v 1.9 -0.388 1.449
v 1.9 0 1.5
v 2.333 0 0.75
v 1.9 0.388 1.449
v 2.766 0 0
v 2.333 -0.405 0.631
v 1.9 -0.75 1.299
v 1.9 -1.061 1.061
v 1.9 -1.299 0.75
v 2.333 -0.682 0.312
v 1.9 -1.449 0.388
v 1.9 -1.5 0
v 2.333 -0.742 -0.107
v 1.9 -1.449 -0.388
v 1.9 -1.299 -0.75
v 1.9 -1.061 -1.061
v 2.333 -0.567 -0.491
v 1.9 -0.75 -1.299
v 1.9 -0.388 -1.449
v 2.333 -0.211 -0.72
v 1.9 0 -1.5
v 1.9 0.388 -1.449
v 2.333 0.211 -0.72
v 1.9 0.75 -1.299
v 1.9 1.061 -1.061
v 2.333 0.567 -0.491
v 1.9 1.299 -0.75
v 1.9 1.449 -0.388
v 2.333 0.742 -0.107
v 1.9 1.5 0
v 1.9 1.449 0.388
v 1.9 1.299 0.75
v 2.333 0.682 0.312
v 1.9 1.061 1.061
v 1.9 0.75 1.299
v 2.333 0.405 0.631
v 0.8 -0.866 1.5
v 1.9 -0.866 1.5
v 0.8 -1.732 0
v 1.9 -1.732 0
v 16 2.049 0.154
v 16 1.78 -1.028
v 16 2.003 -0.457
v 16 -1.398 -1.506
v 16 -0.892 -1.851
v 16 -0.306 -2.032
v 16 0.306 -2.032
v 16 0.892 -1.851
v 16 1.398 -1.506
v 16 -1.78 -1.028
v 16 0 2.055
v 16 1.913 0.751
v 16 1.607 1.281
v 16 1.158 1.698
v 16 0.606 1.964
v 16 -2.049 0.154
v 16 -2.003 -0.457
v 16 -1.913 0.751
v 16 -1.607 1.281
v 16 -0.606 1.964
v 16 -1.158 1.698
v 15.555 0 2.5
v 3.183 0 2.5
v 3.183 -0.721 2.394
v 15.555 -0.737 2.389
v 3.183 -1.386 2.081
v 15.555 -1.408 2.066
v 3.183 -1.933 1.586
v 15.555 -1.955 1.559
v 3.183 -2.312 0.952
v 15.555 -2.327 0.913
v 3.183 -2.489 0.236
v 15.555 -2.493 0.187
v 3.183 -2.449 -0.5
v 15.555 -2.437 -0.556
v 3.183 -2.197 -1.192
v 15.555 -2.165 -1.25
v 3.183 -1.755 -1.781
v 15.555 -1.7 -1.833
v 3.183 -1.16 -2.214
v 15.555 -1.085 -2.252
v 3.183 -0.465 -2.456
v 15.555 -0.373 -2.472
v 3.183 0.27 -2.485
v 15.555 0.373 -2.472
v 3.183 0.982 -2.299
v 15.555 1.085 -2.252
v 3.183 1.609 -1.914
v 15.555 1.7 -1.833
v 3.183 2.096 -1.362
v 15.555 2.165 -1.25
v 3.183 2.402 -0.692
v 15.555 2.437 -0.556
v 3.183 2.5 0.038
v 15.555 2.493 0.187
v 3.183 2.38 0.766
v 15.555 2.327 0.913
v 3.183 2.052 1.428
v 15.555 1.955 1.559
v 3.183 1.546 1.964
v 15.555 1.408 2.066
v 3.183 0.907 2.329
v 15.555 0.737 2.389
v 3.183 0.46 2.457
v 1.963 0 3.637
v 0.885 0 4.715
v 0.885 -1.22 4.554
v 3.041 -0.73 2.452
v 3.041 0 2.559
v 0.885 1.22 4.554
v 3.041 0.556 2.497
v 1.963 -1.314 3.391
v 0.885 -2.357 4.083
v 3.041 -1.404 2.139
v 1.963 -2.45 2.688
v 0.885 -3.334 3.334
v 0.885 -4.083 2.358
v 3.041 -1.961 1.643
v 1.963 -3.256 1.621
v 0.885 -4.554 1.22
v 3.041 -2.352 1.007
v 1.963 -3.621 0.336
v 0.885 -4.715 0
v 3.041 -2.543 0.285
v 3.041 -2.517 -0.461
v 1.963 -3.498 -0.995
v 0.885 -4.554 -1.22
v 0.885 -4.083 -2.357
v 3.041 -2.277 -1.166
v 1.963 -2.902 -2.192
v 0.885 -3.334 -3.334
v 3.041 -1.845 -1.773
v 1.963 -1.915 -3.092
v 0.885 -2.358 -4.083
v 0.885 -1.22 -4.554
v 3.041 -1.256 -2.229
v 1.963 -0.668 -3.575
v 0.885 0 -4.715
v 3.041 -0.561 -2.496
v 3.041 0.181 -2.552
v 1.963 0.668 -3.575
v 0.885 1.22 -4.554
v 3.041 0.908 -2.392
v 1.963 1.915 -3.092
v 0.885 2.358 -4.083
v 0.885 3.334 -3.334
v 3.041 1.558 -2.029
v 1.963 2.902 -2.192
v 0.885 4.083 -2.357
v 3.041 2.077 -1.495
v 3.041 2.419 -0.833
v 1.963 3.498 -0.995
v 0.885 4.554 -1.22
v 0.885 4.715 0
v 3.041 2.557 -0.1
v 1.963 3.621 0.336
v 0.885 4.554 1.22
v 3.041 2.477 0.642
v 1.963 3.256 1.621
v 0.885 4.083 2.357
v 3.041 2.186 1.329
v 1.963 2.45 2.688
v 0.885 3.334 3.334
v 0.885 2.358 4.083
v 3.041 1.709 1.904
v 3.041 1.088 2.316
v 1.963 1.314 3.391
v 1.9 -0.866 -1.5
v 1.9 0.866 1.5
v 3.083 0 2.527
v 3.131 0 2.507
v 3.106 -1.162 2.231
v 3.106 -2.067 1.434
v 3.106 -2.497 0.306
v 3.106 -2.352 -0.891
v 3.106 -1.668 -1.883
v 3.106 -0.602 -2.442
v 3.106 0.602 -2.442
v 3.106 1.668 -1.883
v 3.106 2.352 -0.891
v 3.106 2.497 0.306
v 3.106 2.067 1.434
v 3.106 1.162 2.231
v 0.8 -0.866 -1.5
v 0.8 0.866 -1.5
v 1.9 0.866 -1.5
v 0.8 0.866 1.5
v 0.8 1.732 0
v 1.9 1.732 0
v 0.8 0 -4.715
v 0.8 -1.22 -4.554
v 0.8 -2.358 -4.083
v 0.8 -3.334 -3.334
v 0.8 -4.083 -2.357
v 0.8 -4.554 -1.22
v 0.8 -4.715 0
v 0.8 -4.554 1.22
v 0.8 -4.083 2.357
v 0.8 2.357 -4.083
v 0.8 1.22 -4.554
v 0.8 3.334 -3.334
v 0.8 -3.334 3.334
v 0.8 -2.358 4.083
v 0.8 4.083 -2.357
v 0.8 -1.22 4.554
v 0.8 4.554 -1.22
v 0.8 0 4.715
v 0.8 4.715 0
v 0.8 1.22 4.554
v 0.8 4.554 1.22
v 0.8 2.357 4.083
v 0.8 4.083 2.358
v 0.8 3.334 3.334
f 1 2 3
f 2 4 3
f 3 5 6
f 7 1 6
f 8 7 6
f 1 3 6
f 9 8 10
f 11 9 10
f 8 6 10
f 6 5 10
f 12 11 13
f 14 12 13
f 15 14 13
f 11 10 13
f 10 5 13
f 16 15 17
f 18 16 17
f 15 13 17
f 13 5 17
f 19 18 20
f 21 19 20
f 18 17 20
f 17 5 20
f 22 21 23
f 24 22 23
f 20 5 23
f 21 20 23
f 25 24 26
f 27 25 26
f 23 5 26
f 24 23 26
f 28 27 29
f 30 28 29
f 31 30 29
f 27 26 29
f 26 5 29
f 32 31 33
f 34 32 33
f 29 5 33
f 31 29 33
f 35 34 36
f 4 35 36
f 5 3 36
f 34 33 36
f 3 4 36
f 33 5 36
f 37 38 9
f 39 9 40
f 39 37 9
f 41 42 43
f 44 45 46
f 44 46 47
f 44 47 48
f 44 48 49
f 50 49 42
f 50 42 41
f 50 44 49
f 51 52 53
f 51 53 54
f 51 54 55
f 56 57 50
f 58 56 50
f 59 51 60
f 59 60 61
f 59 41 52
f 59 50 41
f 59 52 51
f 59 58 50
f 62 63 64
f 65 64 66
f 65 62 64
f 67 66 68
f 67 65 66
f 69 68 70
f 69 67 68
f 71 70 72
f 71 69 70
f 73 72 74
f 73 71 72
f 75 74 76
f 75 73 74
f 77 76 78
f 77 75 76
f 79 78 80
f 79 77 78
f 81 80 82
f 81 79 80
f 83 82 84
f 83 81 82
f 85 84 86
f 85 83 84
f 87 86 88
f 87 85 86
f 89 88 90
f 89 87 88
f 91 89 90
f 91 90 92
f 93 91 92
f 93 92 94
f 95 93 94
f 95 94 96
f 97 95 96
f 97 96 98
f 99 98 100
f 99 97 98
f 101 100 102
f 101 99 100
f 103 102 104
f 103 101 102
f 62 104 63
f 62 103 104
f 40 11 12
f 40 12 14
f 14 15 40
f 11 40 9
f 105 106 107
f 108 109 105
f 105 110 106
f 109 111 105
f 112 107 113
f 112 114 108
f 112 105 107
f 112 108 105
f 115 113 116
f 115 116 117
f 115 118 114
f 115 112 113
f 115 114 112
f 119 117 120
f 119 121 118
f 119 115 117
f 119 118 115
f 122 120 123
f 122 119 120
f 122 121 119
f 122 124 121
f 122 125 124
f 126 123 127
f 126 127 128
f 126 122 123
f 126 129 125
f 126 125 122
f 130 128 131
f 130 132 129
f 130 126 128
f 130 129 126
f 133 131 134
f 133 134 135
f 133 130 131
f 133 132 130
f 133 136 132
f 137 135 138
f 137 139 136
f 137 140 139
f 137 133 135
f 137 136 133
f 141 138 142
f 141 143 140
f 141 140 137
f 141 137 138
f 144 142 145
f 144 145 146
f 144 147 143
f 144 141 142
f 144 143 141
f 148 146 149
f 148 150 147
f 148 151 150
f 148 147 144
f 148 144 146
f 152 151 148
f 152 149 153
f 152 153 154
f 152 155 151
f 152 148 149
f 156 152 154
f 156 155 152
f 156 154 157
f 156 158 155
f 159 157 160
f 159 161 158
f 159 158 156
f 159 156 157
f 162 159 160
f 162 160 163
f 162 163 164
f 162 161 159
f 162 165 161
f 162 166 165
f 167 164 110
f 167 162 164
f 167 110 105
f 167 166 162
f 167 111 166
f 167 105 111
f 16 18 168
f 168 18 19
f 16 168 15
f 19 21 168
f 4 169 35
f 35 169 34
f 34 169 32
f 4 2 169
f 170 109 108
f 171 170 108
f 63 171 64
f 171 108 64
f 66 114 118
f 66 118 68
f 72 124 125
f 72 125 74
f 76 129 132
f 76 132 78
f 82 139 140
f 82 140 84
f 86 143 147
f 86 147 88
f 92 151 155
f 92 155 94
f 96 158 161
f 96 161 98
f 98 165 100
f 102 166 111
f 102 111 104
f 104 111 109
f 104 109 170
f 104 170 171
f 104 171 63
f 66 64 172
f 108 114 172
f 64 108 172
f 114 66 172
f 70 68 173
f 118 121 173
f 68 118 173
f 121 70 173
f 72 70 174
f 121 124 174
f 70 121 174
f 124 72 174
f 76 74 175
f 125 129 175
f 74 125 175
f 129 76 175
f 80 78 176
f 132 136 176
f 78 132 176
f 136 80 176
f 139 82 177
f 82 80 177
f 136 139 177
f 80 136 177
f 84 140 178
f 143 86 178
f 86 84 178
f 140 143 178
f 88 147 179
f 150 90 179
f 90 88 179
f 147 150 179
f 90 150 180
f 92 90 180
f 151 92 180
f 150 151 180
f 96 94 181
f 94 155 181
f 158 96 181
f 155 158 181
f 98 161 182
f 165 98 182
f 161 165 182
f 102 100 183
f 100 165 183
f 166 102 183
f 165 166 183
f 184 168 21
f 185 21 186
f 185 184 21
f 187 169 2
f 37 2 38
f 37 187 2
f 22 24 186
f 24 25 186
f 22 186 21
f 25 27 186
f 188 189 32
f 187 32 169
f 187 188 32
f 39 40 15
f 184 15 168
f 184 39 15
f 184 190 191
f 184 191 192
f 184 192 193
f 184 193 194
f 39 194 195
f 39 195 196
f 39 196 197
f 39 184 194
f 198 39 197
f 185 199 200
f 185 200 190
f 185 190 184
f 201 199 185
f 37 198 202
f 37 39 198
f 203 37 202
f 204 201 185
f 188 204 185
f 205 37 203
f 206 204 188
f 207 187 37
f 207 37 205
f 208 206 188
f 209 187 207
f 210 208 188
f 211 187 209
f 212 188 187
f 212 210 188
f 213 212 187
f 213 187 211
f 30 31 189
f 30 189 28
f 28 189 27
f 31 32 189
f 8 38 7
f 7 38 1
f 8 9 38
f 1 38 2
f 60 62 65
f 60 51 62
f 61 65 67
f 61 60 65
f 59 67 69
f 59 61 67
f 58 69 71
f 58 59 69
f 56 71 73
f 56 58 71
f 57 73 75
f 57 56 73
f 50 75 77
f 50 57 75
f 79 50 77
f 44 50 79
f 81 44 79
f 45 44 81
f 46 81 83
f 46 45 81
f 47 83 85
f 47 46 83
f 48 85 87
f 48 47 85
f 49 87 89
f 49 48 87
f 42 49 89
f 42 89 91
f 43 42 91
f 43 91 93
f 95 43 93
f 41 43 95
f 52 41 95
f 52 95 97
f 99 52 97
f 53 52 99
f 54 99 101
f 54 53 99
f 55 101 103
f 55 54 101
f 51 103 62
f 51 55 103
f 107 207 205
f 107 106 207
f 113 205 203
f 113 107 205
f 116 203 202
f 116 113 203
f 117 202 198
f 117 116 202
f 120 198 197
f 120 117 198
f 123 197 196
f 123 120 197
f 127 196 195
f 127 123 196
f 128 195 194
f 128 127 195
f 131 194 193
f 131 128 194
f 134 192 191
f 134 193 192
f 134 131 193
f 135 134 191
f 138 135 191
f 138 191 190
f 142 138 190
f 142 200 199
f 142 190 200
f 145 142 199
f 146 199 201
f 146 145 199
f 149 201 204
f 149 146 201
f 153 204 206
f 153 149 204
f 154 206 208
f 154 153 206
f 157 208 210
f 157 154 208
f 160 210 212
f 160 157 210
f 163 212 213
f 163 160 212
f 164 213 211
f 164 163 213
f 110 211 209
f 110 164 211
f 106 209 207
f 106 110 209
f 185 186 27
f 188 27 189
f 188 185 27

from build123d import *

# Parameters (mm, degrees)
FILLET1_R        = 0.2
HEX_2_DEPTH      = 1.9
EXTRUSION1_START = -0.8
ESQUISSE1_R      = 4.715
EXTRUSION1_DEPTH = 0.8


with BuildPart() as part:
    # BodySke → BaseBody (revolve)
    with BuildSketch(Plane.XY, mode=Mode.PRIVATE) as basebody_sk:
        Polygon((0, 0), (0, 4.715), (0.885, 4.715), (3.1, 2.5), (15.555, 2.5), (16, 2.055), (16, 0), align=None)
    revolve(basebody_sk.sketch.rotate(Axis((0, 0, 0), (1, 0, 0)), 90), axis=Axis((0, 0, 0), (1, 0, 0)))

    # Fillet1
    fillet1_edges = [part.edges().sort_by_distance(p)[0] for p in [
        (3.1, 0, -2.5),
    ]]
    fillet(fillet1_edges, radius=FILLET1_R)

    # Sketch2 → PreBroach (revolve, cut)
    with BuildSketch(Plane.XY, mode=Mode.PRIVATE) as prebroach_sk:
        Polygon((0, 1.5), (1.9, 1.5), (2.766025404, 0), (0, 0), align=None)
    revolve(prebroach_sk.sketch.rotate(Axis((0, 0, 0), (1, 0, 0)), 90), axis=Axis((0, 0, 0), (1, 0, 0)), mode=Mode.SUBTRACT)

    # Sketch3 → Hex 2 (cut)
    with BuildSketch(Plane.ZY):
        Polygon((-1.5, -0.866025404), (-1.5, 0.866025404), (0, 1.732050808), (1.5, 0.866025404), (1.5, -0.866025404), (0, -1.732050808), align=None)
    extrude(amount=-HEX_2_DEPTH, mode=Mode.SUBTRACT)

    # Esquisse1 → Extrusion1 (cut)
    with BuildSketch(Plane.ZY.offset(EXTRUSION1_START)):
        Circle(ESQUISSE1_R)
    extrude(amount=EXTRUSION1_DEPTH, mode=Mode.SUBTRACT)


solid = part.part
